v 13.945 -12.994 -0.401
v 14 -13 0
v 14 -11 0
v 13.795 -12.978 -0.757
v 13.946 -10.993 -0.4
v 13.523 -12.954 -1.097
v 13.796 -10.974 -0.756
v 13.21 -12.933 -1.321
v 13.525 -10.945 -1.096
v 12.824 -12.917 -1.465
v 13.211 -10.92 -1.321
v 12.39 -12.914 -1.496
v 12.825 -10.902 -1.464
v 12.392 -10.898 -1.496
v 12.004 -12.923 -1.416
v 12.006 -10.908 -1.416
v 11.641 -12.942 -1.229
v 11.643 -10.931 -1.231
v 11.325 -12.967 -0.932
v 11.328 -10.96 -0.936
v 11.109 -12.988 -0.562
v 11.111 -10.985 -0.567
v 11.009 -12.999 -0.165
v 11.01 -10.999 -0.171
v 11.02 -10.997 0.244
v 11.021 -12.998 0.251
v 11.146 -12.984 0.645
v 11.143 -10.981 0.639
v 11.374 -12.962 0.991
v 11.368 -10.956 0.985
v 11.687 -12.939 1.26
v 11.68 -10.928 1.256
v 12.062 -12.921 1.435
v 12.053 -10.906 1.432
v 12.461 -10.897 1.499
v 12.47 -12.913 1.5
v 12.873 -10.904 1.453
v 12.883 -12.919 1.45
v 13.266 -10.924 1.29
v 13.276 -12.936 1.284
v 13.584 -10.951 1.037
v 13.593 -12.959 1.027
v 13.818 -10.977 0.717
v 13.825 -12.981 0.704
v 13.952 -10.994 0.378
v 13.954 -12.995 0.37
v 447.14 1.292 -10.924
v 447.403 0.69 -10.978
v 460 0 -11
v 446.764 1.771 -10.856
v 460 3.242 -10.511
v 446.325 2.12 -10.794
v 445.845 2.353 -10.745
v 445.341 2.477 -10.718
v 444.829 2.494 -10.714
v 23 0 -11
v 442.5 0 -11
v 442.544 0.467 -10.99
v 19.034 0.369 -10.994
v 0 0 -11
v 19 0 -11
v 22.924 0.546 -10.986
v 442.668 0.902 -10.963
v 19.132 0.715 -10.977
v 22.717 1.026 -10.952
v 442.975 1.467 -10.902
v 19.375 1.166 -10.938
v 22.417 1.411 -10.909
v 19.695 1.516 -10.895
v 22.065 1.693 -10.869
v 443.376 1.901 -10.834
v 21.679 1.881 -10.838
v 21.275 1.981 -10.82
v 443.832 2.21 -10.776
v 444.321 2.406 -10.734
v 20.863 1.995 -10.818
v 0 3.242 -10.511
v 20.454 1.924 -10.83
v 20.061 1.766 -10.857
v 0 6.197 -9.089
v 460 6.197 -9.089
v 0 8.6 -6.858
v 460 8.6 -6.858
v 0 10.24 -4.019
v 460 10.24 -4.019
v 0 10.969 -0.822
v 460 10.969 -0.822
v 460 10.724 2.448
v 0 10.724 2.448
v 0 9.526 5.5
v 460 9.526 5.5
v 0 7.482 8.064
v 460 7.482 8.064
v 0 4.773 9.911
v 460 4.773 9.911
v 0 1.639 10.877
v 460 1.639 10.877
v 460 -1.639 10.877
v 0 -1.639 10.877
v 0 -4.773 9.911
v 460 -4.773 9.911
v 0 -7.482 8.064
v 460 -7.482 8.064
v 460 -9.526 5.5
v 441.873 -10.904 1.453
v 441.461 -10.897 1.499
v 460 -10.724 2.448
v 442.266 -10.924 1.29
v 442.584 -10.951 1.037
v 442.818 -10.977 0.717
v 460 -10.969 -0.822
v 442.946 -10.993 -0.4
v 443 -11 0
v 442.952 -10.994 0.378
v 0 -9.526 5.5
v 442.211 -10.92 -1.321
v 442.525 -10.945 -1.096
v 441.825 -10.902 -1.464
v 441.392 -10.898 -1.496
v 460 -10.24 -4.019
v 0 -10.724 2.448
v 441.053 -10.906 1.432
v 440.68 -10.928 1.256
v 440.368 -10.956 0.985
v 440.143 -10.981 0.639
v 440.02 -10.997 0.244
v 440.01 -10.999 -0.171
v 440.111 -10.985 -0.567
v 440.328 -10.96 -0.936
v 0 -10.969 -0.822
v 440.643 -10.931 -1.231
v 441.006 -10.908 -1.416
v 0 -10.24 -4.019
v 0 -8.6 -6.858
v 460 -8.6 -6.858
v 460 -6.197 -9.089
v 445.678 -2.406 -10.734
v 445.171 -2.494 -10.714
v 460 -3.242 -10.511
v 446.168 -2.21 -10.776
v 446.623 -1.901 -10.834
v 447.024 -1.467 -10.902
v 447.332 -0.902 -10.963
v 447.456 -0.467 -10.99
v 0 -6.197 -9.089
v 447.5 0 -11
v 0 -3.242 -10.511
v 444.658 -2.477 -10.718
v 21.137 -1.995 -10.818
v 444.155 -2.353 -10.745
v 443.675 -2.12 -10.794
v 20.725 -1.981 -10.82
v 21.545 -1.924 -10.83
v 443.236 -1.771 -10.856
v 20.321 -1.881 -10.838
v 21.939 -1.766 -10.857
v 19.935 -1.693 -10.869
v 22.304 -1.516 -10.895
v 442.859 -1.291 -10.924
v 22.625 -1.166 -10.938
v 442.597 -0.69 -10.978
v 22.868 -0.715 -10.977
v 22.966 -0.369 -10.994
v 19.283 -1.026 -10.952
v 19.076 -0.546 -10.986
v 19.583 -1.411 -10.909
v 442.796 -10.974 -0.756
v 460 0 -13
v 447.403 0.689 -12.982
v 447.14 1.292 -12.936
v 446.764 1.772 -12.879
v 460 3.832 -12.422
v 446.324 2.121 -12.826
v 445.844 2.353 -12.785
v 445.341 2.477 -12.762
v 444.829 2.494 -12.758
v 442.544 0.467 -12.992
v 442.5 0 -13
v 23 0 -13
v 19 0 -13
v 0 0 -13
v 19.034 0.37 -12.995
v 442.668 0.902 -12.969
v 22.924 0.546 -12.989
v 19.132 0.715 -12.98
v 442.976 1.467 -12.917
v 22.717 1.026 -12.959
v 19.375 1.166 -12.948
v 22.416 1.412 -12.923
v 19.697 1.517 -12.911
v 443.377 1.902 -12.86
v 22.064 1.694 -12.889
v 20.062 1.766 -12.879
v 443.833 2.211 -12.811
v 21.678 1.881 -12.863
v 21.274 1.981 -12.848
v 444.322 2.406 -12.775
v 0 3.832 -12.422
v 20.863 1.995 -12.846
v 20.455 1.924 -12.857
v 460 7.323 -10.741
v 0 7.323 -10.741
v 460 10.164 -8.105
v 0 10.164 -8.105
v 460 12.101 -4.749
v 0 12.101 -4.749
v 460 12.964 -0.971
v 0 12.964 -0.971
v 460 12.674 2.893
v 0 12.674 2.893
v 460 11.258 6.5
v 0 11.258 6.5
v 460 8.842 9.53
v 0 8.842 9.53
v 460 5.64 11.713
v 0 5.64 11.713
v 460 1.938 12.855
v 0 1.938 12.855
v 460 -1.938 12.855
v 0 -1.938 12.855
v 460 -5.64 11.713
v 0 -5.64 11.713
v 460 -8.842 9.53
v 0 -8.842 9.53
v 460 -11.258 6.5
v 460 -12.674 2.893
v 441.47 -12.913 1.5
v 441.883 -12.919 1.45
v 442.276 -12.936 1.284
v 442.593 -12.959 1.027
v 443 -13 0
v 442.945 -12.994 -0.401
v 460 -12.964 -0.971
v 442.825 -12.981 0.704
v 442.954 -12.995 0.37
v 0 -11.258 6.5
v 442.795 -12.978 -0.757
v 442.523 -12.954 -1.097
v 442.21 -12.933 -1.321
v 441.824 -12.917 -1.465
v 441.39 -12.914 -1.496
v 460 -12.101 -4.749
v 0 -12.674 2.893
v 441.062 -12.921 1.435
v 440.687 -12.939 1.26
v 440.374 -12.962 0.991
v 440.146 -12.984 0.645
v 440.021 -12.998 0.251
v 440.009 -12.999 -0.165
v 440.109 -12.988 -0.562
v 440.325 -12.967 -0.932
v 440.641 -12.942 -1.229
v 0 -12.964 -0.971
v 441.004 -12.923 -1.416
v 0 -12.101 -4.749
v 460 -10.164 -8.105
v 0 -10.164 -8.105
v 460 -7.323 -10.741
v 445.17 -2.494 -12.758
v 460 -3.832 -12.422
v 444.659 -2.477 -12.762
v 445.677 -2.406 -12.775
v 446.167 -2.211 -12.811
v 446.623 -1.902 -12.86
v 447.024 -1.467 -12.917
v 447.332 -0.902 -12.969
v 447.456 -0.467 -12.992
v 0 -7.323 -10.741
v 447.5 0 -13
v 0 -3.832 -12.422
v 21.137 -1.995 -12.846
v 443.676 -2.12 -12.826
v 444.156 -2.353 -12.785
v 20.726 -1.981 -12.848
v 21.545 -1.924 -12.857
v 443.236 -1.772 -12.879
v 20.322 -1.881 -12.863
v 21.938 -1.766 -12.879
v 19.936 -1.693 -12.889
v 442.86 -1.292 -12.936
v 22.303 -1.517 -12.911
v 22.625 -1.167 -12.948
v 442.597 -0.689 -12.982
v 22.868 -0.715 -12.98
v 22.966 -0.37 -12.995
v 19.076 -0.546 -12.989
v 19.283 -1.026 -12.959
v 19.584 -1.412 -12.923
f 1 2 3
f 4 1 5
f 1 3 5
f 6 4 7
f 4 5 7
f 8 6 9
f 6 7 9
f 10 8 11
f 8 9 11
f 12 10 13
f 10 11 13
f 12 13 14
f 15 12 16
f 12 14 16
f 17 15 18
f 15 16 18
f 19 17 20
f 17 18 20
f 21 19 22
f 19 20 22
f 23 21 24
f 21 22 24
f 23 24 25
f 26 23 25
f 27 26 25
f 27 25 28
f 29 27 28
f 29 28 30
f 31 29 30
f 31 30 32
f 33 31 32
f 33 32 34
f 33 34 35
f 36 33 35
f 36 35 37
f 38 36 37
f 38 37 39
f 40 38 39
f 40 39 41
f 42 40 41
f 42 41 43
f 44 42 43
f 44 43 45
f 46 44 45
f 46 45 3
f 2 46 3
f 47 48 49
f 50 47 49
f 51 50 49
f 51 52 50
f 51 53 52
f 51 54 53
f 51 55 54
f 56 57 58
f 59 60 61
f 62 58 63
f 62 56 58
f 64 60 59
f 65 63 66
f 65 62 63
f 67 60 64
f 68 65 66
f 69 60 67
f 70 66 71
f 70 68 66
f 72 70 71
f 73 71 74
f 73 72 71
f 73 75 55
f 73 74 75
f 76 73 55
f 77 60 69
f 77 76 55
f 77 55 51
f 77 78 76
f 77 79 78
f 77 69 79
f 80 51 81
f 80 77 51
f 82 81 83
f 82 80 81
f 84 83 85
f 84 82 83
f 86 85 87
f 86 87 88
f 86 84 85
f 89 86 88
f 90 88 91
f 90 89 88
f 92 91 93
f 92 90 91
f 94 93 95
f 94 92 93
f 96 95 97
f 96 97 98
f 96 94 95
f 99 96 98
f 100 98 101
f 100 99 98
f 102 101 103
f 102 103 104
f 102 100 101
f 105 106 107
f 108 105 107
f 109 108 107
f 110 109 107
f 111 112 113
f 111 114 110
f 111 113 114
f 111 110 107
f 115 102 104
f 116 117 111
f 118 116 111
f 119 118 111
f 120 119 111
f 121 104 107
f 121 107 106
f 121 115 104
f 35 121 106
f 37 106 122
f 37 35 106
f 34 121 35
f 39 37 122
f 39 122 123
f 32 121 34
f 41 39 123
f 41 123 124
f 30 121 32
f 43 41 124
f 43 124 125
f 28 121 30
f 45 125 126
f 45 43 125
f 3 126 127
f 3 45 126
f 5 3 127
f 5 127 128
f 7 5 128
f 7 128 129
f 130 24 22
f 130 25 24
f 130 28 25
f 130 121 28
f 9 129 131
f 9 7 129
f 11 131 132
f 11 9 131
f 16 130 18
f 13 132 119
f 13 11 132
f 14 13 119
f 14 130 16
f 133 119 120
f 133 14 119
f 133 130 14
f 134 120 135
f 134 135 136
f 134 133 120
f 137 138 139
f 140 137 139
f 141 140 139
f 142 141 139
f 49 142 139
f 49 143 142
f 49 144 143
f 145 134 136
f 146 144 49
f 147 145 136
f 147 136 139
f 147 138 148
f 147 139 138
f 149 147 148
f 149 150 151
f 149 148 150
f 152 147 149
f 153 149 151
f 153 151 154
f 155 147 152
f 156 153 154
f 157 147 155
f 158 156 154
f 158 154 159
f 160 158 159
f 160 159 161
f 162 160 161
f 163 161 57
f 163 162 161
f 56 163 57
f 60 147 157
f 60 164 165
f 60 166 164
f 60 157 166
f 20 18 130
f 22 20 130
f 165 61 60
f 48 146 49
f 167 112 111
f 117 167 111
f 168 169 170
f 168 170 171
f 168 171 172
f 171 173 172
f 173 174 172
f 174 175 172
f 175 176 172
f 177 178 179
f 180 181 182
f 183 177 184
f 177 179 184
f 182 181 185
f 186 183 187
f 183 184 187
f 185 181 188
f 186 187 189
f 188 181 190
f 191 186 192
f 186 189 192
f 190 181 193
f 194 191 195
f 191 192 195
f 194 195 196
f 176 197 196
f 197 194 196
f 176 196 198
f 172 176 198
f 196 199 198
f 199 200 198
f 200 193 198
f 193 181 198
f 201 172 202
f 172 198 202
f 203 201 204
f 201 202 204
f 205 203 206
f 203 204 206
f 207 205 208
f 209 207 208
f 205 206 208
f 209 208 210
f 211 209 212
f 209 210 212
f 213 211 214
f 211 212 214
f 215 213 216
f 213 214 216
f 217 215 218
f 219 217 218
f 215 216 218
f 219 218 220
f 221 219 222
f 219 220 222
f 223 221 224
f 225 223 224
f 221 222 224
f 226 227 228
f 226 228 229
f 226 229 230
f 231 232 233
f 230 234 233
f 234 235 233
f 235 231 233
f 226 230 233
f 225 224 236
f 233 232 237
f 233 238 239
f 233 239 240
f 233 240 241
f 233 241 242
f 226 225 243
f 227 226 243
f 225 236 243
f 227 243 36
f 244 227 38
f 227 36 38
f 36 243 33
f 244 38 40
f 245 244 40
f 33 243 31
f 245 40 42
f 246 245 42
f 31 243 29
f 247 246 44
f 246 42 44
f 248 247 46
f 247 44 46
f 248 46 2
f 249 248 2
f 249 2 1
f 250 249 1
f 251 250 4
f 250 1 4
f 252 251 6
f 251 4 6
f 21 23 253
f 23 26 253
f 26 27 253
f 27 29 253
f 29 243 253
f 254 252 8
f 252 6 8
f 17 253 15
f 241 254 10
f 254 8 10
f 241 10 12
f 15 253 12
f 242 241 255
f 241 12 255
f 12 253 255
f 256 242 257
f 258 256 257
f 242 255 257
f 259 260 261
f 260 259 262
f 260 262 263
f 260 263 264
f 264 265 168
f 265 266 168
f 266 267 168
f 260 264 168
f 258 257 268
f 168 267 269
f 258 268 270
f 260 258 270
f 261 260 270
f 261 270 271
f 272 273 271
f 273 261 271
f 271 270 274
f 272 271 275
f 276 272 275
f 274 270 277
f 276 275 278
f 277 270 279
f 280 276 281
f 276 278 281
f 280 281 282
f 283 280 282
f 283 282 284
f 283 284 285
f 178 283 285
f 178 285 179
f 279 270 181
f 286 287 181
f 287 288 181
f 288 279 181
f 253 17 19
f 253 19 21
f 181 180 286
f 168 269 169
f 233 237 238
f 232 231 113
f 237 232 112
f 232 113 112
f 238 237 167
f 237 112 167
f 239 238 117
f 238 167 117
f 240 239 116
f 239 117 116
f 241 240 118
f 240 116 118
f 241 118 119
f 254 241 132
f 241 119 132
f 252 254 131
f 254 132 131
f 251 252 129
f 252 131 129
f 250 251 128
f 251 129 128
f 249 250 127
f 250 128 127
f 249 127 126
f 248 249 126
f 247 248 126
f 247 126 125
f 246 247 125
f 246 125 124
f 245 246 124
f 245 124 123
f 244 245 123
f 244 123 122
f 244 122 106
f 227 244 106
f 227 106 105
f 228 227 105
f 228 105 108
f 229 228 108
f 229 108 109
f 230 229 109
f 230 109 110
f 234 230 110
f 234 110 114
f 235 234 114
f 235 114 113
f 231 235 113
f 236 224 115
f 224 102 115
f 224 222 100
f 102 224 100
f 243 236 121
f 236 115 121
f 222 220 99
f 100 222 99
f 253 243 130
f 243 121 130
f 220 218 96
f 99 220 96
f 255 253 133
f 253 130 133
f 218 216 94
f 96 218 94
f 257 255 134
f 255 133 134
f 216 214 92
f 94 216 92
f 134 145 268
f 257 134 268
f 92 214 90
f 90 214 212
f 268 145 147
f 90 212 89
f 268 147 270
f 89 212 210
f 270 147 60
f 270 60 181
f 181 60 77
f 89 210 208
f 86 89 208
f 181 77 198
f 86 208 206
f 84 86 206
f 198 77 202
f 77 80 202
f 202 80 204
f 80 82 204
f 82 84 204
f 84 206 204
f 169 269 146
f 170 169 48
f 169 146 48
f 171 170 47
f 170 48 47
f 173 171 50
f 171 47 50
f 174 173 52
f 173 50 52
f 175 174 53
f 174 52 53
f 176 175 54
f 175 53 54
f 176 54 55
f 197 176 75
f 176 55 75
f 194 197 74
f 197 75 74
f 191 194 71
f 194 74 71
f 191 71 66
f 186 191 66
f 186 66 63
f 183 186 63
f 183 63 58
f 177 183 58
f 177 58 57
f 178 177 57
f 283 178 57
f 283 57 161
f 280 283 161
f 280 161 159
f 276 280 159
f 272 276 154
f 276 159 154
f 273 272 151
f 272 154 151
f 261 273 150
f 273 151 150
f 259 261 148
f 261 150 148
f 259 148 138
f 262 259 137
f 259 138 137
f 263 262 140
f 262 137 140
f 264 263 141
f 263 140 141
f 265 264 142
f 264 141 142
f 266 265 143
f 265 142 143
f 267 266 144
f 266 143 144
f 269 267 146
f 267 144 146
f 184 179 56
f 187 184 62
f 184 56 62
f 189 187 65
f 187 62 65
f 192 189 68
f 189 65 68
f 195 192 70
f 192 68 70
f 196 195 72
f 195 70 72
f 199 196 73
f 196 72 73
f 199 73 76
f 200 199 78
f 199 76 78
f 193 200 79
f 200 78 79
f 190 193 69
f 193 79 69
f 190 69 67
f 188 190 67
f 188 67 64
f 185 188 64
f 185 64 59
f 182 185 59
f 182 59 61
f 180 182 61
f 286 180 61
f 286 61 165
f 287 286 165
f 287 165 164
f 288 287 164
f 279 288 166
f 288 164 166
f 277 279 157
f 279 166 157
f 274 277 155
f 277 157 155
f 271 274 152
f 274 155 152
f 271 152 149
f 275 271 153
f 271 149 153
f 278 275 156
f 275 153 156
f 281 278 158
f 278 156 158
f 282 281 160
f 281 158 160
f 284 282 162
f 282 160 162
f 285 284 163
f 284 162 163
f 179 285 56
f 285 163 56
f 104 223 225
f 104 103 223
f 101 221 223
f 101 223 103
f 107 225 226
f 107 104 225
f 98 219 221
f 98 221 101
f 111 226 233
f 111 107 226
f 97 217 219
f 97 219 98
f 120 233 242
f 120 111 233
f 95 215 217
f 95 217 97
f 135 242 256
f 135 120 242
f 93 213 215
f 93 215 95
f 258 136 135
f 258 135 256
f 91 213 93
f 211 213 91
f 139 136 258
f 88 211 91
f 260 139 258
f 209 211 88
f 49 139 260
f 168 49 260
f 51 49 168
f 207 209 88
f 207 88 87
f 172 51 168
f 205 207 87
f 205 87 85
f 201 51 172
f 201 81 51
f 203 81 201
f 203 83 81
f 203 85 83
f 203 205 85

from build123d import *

# Parameters (mm, degrees)
SKETCH_1_R          = 13
SKETCH_1_R_2        = 11
EXTRUDE_1_DEPTH     = 460
SKETCH_2_R          = 2
SKETCH_2_R_2        = 2.5
CUT_EXTRUDE_1_DEPTH = 14
SKETCH_4_R          = 1.5
CUT_EXTRUDE_2_DEPTH = 14.0000001


with BuildPart() as part:
    # 草图1 → 凸台-拉伸1 (new body)
    with BuildSketch(Plane(origin=(0, 0, 0), x_dir=(0, 0, -1), z_dir=(1, 0, 0))):
        Circle(SKETCH_1_R)
        Circle(SKETCH_1_R_2, mode=Mode.SUBTRACT)
    extrude(amount=EXTRUDE_1_DEPTH)

    # 草图2 → 切除-拉伸1 (cut, through all)
    with BuildSketch(Plane.XY):
        with Locations((21, 0)):
            Circle(SKETCH_2_R)
        with Locations((445, 0)):
            Circle(SKETCH_2_R_2)
    extrude(amount=-CUT_EXTRUDE_1_DEPTH, mode=Mode.SUBTRACT)

    # 草图4 → 切除-拉伸2 (cut, through all)
    with BuildSketch(Plane(origin=(0, 0, 0), x_dir=(1, 0, 0), z_dir=(0, 1, 0))):
        with Locations((12.5, 0)):
            Circle(SKETCH_4_R)
        with Locations((441.5, 0)):
            Circle(SKETCH_4_R)
    extrude(amount=-CUT_EXTRUDE_2_DEPTH, mode=Mode.SUBTRACT)


solid = part.part
